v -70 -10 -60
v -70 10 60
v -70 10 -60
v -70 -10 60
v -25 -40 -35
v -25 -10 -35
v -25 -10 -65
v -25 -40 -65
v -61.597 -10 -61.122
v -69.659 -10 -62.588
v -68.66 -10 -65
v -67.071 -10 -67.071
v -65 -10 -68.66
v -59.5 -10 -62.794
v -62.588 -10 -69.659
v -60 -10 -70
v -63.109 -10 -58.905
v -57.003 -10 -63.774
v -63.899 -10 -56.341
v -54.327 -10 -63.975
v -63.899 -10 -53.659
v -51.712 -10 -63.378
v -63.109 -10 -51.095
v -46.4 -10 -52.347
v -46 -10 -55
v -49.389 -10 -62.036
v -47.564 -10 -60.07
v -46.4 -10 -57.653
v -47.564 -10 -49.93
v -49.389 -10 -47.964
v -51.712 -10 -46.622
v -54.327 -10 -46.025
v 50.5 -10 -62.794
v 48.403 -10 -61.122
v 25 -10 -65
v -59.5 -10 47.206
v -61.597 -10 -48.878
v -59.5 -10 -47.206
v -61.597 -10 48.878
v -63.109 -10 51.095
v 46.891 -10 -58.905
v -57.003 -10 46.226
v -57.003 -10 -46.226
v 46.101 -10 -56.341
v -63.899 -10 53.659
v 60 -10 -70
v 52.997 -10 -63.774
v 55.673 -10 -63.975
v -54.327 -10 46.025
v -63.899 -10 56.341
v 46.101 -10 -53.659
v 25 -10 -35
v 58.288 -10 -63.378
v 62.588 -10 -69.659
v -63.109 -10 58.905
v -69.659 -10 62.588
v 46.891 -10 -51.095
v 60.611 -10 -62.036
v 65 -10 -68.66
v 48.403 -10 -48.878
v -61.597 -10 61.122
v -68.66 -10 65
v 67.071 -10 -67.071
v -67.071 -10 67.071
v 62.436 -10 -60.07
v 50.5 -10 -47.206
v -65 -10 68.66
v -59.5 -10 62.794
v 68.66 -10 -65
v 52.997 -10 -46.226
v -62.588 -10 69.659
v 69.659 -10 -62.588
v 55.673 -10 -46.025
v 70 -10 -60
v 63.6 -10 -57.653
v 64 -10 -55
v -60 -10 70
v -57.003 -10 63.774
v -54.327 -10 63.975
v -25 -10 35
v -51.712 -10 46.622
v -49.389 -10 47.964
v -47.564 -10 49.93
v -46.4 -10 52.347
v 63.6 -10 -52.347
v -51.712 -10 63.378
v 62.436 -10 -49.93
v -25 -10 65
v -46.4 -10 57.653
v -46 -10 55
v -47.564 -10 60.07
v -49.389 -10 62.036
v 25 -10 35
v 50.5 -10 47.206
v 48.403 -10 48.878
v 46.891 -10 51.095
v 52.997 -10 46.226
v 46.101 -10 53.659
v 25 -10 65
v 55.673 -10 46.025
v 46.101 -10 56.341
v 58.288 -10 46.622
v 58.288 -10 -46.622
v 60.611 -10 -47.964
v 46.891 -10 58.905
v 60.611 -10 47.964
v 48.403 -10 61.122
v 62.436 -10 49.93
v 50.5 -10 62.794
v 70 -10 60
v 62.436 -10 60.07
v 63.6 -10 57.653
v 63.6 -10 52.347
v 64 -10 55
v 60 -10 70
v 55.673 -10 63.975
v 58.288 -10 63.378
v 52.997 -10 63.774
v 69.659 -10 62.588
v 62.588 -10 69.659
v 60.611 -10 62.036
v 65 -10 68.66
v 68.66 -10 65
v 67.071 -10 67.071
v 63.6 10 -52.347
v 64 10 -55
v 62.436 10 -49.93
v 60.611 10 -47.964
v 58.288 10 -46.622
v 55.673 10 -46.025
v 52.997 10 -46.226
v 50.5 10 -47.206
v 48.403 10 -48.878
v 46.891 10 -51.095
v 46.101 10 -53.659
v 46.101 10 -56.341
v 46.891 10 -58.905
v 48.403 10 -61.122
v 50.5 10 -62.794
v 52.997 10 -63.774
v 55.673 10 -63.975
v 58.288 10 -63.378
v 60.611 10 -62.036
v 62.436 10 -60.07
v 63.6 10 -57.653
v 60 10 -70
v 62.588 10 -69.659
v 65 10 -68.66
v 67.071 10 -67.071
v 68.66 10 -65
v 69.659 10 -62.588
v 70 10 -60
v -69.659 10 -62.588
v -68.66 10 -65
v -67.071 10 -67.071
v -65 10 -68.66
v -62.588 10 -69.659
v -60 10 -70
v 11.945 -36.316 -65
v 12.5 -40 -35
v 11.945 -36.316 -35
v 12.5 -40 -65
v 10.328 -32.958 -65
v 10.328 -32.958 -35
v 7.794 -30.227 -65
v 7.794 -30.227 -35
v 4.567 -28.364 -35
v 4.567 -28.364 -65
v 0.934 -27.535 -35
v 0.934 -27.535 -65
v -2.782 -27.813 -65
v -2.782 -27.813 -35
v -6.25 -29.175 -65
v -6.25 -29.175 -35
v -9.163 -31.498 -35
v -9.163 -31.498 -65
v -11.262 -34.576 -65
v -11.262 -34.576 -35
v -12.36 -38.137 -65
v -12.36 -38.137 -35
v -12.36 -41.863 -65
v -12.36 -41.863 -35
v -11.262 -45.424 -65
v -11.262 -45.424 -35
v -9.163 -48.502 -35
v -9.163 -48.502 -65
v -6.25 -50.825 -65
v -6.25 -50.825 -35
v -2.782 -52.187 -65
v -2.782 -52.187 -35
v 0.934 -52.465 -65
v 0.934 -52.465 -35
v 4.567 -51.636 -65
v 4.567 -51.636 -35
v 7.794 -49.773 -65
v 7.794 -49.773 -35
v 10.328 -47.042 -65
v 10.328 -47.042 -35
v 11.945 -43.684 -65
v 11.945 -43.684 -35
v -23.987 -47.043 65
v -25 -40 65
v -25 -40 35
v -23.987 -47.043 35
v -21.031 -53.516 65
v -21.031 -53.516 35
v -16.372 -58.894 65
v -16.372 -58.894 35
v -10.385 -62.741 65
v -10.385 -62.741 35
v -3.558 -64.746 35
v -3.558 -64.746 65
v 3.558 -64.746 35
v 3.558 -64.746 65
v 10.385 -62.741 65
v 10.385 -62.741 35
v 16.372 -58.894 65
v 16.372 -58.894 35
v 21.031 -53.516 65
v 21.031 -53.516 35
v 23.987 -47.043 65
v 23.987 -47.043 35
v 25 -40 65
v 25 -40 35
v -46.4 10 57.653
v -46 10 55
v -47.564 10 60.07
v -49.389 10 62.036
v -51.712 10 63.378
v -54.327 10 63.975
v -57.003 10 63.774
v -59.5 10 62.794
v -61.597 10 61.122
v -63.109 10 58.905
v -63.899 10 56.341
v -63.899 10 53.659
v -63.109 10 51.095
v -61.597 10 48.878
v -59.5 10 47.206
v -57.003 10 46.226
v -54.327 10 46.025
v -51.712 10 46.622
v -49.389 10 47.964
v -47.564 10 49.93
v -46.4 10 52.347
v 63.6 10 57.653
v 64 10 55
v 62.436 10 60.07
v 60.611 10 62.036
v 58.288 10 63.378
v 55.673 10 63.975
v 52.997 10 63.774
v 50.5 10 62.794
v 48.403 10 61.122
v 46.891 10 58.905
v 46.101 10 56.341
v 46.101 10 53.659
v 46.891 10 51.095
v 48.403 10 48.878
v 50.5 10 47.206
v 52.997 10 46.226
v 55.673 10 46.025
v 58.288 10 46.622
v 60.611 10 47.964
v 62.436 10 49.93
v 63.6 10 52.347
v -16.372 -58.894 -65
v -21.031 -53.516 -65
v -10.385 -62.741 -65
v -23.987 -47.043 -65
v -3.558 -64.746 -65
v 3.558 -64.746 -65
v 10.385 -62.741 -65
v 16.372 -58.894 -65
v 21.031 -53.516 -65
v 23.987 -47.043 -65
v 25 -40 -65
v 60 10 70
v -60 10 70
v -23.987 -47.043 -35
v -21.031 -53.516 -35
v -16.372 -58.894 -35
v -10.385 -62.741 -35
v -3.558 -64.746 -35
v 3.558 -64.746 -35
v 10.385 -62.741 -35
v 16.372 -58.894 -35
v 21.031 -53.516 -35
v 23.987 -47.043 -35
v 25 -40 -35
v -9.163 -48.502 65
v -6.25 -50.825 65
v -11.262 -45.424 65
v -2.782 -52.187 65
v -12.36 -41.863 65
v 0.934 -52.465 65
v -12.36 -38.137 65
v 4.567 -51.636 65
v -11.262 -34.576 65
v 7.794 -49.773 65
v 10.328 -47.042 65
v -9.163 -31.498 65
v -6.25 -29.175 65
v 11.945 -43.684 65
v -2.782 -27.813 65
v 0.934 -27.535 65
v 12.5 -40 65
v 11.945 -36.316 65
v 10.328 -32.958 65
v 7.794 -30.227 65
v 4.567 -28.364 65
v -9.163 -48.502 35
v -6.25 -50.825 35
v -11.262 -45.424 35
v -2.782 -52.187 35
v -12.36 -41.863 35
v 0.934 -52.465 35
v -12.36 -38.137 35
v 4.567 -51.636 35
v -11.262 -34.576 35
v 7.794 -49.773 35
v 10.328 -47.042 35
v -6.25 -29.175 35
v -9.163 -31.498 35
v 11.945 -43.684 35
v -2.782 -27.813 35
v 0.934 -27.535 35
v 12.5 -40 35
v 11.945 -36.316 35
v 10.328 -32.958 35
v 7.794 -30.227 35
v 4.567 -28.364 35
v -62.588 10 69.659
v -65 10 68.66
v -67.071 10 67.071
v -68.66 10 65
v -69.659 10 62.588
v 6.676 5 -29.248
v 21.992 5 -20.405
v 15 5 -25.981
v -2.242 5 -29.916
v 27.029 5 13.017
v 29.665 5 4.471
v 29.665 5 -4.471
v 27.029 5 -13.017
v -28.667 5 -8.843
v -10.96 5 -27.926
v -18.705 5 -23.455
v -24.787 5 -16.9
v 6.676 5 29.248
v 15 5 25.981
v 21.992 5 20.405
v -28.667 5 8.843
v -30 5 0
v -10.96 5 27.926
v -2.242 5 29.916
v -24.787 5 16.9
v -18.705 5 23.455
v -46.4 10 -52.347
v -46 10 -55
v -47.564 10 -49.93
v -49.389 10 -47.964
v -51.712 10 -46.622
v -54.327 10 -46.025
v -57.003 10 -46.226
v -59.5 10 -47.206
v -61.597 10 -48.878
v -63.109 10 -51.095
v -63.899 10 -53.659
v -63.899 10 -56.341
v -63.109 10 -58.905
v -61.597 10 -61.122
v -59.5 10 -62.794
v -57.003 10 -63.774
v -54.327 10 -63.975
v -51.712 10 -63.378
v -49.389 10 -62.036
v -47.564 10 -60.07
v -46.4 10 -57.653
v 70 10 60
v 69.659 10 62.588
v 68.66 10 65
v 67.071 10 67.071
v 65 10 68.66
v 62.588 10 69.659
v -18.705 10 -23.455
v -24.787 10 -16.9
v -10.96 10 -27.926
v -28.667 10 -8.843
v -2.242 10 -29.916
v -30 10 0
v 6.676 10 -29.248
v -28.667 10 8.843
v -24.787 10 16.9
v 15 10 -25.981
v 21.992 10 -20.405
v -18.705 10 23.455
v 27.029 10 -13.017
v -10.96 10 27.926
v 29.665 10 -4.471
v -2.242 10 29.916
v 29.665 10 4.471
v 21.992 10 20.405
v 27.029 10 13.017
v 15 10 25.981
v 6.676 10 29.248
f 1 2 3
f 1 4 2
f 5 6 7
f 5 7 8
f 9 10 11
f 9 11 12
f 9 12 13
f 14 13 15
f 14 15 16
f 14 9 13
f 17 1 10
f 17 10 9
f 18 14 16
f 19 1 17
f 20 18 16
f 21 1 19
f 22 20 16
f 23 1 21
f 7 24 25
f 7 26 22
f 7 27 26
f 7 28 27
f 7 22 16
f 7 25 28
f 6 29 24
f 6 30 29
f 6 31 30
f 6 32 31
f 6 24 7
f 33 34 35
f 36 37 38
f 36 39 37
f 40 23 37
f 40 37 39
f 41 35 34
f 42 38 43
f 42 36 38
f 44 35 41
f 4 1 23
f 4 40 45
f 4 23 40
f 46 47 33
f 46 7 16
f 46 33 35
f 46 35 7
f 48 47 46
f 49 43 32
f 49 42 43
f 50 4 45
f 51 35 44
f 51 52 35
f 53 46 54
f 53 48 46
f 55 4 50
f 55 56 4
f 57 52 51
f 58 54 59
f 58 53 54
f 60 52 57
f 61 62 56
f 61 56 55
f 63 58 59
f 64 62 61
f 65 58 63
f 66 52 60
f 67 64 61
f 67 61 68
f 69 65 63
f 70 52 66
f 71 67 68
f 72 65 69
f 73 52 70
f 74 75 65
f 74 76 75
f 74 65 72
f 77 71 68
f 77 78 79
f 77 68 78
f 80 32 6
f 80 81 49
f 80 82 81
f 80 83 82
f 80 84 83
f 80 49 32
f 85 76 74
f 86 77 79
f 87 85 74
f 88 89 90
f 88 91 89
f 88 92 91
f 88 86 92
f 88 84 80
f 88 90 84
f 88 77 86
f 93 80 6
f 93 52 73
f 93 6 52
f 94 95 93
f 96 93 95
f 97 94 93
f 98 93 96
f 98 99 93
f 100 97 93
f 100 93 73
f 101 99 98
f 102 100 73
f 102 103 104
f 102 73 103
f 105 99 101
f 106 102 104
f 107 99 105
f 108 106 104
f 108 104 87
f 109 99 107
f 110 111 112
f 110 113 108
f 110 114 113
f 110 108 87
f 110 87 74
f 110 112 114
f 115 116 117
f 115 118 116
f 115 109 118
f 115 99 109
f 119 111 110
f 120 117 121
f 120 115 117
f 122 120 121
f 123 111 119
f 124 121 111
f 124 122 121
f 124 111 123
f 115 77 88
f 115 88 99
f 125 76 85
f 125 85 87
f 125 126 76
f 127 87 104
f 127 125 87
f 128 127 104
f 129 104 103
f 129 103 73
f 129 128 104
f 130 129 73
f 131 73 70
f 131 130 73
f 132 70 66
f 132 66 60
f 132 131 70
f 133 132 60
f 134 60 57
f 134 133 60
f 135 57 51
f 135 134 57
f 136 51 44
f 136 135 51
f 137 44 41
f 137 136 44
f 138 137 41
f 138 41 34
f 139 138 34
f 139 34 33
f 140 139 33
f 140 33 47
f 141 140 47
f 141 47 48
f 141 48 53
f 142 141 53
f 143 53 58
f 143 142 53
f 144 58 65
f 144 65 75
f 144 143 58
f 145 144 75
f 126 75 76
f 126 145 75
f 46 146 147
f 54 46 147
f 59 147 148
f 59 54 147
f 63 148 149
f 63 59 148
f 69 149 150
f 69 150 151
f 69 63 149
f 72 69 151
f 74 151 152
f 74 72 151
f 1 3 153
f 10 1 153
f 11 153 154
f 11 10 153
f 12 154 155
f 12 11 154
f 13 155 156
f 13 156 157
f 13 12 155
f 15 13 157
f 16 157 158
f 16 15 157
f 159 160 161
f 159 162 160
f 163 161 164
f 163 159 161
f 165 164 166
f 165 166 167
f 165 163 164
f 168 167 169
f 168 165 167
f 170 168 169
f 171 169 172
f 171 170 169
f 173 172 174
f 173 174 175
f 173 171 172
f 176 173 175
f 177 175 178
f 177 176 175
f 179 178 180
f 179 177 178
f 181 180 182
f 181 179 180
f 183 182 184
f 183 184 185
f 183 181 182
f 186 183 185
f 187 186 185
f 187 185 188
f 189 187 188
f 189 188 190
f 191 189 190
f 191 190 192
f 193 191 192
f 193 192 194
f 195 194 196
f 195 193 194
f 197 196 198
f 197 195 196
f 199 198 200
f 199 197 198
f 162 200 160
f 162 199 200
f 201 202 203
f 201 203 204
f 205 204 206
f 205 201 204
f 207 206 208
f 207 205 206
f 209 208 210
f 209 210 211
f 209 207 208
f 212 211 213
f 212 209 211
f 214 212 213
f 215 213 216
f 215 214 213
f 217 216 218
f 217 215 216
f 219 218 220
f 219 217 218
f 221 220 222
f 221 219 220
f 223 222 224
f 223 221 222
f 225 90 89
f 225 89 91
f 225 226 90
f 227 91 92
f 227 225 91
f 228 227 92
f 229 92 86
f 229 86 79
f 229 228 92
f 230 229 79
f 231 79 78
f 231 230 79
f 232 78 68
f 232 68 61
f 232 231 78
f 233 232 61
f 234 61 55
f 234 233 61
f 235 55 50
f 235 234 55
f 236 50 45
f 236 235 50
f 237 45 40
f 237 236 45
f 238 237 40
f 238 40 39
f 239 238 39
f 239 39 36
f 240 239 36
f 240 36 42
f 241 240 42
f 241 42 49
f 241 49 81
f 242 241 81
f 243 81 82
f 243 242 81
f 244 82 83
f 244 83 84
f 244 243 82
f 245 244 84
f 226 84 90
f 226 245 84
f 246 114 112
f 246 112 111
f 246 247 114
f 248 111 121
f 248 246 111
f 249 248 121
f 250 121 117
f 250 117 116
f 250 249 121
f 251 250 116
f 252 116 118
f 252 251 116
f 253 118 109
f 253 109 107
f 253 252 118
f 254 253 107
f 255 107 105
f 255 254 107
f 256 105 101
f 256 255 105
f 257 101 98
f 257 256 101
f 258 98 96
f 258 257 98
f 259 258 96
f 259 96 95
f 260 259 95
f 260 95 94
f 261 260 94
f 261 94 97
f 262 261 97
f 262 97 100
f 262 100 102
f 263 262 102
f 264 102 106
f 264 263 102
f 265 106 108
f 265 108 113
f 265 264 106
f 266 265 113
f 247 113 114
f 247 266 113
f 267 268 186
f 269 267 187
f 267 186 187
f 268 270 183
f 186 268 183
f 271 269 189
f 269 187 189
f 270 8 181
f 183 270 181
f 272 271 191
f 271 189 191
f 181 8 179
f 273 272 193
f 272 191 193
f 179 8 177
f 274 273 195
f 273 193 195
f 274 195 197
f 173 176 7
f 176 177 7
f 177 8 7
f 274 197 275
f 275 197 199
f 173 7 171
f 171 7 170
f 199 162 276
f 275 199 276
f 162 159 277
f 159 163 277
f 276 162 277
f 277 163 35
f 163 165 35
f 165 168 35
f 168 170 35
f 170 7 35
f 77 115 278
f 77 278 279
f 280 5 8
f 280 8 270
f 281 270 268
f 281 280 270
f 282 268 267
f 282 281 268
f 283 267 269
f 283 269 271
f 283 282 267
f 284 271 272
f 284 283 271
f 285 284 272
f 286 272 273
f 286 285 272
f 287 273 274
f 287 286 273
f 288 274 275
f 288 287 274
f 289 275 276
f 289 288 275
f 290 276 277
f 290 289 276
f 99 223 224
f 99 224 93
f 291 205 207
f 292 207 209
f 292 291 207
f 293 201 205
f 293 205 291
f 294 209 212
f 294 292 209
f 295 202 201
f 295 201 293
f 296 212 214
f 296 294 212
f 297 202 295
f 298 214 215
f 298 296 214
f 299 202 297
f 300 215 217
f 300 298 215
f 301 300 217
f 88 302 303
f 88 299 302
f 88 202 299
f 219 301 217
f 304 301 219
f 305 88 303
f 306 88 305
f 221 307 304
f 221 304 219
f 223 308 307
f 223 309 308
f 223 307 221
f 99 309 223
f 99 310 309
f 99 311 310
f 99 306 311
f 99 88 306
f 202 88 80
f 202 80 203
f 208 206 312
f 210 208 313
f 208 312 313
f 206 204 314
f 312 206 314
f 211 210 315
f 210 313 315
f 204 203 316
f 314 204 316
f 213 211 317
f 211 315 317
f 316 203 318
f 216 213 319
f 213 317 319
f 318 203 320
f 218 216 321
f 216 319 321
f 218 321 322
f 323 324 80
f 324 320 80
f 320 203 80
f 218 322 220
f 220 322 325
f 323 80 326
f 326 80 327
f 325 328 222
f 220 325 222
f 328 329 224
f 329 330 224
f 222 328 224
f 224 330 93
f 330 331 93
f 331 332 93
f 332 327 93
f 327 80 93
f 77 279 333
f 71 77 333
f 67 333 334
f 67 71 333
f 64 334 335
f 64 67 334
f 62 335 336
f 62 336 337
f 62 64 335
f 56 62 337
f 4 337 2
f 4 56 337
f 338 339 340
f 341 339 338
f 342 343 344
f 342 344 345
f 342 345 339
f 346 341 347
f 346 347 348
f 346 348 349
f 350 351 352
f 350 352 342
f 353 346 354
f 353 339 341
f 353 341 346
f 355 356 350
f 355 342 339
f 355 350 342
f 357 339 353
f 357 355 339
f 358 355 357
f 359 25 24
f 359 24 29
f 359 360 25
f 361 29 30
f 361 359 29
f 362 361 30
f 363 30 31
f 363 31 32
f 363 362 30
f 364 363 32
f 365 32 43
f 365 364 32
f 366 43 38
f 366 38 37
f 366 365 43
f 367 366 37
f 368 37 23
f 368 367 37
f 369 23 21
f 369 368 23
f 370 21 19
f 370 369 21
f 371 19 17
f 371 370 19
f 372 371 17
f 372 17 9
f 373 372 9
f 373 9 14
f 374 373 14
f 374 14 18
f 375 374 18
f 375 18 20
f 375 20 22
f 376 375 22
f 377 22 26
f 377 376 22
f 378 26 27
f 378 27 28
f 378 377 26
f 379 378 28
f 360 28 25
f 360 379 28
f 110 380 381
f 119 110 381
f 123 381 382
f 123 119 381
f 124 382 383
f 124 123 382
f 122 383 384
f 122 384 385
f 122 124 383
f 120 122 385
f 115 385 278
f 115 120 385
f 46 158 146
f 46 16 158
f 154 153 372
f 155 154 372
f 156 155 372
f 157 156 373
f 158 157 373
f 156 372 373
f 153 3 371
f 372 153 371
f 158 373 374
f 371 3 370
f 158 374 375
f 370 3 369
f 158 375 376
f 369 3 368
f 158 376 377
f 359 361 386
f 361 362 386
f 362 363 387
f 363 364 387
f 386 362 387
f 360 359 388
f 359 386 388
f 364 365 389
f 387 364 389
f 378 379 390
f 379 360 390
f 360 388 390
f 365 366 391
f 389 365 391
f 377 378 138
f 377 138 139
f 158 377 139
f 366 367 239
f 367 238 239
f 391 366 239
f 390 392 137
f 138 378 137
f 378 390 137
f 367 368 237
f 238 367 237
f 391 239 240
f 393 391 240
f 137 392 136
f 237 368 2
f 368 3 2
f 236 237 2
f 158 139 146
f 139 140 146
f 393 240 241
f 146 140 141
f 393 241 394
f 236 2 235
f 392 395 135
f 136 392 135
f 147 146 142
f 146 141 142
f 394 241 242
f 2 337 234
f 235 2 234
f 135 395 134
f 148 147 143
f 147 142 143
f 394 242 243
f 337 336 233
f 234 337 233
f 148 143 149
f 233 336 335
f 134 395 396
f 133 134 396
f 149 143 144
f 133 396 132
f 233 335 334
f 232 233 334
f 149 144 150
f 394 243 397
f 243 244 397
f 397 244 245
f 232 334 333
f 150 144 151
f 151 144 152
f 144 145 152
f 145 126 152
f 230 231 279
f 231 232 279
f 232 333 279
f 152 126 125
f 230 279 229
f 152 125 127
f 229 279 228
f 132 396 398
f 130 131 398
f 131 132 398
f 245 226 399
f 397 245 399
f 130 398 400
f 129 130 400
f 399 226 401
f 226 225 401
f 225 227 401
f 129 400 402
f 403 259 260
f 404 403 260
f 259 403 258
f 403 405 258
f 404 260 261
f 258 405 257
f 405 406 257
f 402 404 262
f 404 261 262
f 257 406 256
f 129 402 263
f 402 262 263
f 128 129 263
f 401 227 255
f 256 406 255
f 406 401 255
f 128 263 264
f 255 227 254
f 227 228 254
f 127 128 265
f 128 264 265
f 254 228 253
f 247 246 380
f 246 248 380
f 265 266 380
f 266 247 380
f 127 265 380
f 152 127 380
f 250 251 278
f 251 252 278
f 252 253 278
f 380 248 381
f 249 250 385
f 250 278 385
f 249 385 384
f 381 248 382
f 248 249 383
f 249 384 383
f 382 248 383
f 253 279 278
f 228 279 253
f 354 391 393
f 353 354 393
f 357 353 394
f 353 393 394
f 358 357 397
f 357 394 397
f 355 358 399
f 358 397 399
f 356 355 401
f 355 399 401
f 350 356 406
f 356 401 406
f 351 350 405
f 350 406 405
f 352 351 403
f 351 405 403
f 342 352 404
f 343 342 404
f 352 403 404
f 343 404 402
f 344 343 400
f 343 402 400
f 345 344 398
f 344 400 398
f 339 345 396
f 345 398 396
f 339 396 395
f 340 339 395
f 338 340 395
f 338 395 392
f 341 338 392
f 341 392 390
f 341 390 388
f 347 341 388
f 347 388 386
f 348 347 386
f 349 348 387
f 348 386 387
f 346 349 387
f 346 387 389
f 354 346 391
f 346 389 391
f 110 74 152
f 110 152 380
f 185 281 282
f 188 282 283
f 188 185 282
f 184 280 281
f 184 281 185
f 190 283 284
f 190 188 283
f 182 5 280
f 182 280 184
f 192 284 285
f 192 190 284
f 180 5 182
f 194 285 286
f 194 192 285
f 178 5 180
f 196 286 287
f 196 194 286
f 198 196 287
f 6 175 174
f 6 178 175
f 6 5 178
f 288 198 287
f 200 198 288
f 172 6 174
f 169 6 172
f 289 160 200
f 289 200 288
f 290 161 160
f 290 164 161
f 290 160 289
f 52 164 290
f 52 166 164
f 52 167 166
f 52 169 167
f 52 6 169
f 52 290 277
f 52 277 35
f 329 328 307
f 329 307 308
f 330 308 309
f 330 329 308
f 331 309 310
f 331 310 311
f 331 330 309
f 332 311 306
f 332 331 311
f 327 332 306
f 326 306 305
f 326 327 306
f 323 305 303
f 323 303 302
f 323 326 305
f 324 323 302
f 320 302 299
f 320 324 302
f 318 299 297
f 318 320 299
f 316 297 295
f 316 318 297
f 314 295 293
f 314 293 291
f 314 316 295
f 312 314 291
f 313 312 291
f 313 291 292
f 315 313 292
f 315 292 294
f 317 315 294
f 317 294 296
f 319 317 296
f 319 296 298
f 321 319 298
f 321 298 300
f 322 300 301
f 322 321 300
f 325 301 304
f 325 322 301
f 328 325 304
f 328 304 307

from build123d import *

# Parameters (mm, degrees)
F0_R     = 9
F1_DEPTH = 10
F3_R     = 12.5
F4_DEPTH = 65
F5_DEPTH = 35
F7_R     = 30
F8_DEPTH = 5


with BuildPart() as f1:
    # F0 (on Front) → F1 (new body, symmetric)
    with BuildSketch(Plane.XZ):
        with BuildLine():
            Line((-60, -70), (60, -70))
            ThreePointArc((60, -70), (67.0710678119, -67.0710678119), (70, -60))
            Line((70, -60), (70, 60))
            ThreePointArc((70, 60), (67.0710678119, 67.0710678119), (60, 70))
            Line((60, 70), (-60, 70))
            ThreePointArc((-60, 70), (-67.0710678119, 67.0710678119), (-70, 60))
            Line((-70, 60), (-70, -60))
            ThreePointArc((-70, -60), (-67.0710678119, -67.0710678119), (-60, -70))
        make_face()
        with Locations((-55, -55)):
            Circle(F0_R, mode=Mode.SUBTRACT)
        with Locations((55, -55)):
            Circle(F0_R, mode=Mode.SUBTRACT)
        with Locations((-55, 55)):
            Circle(F0_R, mode=Mode.SUBTRACT)
        with Locations((55, 55)):
            Circle(F0_R, mode=Mode.SUBTRACT)
    extrude(amount=F1_DEPTH, both=True)

    # F3 (on Top) → F4 (join, symmetric)
    with BuildSketch(Plane.XY):
        with BuildLine():
            Line((-25, -10), (-25, -40))
            ThreePointArc((-25, -40), (0, -65), (25, -40))
            Line((25, -40), (25, -10))
            Line((25, -10), (-25, -10))
        make_face()
        with Locations((0, -40)):
            Circle(F3_R, mode=Mode.SUBTRACT)
    extrude(amount=F4_DEPTH, both=True)


with BuildPart() as f5:
    # F3 (on Top) → F5 (new body, symmetric)
    with BuildSketch(Plane.XY):
        with BuildLine():
            Line((-25, -10), (-25, -40))
            ThreePointArc((-25, -40), (0, -65), (25, -40))
            Line((25, -40), (25, -10))
            Line((25, -10), (-25, -10))
        make_face()
        with Locations((0, -40)):
            Circle(F3_R, mode=Mode.SUBTRACT)
    extrude(amount=F5_DEPTH, both=True)


with BuildPart() as f1_1:
    add(f1.part)

    # F6: cut F5
    add(f5.part, mode=Mode.SUBTRACT)

    # F7 (on face) → F8 (cut)
    with BuildSketch(Plane(origin=(0, 10, 0), x_dir=(-1, 0, 0), z_dir=(0, 1, 0))):
        Circle(F7_R)
    extrude(amount=-F8_DEPTH, mode=Mode.SUBTRACT)


solid = f1_1.part
